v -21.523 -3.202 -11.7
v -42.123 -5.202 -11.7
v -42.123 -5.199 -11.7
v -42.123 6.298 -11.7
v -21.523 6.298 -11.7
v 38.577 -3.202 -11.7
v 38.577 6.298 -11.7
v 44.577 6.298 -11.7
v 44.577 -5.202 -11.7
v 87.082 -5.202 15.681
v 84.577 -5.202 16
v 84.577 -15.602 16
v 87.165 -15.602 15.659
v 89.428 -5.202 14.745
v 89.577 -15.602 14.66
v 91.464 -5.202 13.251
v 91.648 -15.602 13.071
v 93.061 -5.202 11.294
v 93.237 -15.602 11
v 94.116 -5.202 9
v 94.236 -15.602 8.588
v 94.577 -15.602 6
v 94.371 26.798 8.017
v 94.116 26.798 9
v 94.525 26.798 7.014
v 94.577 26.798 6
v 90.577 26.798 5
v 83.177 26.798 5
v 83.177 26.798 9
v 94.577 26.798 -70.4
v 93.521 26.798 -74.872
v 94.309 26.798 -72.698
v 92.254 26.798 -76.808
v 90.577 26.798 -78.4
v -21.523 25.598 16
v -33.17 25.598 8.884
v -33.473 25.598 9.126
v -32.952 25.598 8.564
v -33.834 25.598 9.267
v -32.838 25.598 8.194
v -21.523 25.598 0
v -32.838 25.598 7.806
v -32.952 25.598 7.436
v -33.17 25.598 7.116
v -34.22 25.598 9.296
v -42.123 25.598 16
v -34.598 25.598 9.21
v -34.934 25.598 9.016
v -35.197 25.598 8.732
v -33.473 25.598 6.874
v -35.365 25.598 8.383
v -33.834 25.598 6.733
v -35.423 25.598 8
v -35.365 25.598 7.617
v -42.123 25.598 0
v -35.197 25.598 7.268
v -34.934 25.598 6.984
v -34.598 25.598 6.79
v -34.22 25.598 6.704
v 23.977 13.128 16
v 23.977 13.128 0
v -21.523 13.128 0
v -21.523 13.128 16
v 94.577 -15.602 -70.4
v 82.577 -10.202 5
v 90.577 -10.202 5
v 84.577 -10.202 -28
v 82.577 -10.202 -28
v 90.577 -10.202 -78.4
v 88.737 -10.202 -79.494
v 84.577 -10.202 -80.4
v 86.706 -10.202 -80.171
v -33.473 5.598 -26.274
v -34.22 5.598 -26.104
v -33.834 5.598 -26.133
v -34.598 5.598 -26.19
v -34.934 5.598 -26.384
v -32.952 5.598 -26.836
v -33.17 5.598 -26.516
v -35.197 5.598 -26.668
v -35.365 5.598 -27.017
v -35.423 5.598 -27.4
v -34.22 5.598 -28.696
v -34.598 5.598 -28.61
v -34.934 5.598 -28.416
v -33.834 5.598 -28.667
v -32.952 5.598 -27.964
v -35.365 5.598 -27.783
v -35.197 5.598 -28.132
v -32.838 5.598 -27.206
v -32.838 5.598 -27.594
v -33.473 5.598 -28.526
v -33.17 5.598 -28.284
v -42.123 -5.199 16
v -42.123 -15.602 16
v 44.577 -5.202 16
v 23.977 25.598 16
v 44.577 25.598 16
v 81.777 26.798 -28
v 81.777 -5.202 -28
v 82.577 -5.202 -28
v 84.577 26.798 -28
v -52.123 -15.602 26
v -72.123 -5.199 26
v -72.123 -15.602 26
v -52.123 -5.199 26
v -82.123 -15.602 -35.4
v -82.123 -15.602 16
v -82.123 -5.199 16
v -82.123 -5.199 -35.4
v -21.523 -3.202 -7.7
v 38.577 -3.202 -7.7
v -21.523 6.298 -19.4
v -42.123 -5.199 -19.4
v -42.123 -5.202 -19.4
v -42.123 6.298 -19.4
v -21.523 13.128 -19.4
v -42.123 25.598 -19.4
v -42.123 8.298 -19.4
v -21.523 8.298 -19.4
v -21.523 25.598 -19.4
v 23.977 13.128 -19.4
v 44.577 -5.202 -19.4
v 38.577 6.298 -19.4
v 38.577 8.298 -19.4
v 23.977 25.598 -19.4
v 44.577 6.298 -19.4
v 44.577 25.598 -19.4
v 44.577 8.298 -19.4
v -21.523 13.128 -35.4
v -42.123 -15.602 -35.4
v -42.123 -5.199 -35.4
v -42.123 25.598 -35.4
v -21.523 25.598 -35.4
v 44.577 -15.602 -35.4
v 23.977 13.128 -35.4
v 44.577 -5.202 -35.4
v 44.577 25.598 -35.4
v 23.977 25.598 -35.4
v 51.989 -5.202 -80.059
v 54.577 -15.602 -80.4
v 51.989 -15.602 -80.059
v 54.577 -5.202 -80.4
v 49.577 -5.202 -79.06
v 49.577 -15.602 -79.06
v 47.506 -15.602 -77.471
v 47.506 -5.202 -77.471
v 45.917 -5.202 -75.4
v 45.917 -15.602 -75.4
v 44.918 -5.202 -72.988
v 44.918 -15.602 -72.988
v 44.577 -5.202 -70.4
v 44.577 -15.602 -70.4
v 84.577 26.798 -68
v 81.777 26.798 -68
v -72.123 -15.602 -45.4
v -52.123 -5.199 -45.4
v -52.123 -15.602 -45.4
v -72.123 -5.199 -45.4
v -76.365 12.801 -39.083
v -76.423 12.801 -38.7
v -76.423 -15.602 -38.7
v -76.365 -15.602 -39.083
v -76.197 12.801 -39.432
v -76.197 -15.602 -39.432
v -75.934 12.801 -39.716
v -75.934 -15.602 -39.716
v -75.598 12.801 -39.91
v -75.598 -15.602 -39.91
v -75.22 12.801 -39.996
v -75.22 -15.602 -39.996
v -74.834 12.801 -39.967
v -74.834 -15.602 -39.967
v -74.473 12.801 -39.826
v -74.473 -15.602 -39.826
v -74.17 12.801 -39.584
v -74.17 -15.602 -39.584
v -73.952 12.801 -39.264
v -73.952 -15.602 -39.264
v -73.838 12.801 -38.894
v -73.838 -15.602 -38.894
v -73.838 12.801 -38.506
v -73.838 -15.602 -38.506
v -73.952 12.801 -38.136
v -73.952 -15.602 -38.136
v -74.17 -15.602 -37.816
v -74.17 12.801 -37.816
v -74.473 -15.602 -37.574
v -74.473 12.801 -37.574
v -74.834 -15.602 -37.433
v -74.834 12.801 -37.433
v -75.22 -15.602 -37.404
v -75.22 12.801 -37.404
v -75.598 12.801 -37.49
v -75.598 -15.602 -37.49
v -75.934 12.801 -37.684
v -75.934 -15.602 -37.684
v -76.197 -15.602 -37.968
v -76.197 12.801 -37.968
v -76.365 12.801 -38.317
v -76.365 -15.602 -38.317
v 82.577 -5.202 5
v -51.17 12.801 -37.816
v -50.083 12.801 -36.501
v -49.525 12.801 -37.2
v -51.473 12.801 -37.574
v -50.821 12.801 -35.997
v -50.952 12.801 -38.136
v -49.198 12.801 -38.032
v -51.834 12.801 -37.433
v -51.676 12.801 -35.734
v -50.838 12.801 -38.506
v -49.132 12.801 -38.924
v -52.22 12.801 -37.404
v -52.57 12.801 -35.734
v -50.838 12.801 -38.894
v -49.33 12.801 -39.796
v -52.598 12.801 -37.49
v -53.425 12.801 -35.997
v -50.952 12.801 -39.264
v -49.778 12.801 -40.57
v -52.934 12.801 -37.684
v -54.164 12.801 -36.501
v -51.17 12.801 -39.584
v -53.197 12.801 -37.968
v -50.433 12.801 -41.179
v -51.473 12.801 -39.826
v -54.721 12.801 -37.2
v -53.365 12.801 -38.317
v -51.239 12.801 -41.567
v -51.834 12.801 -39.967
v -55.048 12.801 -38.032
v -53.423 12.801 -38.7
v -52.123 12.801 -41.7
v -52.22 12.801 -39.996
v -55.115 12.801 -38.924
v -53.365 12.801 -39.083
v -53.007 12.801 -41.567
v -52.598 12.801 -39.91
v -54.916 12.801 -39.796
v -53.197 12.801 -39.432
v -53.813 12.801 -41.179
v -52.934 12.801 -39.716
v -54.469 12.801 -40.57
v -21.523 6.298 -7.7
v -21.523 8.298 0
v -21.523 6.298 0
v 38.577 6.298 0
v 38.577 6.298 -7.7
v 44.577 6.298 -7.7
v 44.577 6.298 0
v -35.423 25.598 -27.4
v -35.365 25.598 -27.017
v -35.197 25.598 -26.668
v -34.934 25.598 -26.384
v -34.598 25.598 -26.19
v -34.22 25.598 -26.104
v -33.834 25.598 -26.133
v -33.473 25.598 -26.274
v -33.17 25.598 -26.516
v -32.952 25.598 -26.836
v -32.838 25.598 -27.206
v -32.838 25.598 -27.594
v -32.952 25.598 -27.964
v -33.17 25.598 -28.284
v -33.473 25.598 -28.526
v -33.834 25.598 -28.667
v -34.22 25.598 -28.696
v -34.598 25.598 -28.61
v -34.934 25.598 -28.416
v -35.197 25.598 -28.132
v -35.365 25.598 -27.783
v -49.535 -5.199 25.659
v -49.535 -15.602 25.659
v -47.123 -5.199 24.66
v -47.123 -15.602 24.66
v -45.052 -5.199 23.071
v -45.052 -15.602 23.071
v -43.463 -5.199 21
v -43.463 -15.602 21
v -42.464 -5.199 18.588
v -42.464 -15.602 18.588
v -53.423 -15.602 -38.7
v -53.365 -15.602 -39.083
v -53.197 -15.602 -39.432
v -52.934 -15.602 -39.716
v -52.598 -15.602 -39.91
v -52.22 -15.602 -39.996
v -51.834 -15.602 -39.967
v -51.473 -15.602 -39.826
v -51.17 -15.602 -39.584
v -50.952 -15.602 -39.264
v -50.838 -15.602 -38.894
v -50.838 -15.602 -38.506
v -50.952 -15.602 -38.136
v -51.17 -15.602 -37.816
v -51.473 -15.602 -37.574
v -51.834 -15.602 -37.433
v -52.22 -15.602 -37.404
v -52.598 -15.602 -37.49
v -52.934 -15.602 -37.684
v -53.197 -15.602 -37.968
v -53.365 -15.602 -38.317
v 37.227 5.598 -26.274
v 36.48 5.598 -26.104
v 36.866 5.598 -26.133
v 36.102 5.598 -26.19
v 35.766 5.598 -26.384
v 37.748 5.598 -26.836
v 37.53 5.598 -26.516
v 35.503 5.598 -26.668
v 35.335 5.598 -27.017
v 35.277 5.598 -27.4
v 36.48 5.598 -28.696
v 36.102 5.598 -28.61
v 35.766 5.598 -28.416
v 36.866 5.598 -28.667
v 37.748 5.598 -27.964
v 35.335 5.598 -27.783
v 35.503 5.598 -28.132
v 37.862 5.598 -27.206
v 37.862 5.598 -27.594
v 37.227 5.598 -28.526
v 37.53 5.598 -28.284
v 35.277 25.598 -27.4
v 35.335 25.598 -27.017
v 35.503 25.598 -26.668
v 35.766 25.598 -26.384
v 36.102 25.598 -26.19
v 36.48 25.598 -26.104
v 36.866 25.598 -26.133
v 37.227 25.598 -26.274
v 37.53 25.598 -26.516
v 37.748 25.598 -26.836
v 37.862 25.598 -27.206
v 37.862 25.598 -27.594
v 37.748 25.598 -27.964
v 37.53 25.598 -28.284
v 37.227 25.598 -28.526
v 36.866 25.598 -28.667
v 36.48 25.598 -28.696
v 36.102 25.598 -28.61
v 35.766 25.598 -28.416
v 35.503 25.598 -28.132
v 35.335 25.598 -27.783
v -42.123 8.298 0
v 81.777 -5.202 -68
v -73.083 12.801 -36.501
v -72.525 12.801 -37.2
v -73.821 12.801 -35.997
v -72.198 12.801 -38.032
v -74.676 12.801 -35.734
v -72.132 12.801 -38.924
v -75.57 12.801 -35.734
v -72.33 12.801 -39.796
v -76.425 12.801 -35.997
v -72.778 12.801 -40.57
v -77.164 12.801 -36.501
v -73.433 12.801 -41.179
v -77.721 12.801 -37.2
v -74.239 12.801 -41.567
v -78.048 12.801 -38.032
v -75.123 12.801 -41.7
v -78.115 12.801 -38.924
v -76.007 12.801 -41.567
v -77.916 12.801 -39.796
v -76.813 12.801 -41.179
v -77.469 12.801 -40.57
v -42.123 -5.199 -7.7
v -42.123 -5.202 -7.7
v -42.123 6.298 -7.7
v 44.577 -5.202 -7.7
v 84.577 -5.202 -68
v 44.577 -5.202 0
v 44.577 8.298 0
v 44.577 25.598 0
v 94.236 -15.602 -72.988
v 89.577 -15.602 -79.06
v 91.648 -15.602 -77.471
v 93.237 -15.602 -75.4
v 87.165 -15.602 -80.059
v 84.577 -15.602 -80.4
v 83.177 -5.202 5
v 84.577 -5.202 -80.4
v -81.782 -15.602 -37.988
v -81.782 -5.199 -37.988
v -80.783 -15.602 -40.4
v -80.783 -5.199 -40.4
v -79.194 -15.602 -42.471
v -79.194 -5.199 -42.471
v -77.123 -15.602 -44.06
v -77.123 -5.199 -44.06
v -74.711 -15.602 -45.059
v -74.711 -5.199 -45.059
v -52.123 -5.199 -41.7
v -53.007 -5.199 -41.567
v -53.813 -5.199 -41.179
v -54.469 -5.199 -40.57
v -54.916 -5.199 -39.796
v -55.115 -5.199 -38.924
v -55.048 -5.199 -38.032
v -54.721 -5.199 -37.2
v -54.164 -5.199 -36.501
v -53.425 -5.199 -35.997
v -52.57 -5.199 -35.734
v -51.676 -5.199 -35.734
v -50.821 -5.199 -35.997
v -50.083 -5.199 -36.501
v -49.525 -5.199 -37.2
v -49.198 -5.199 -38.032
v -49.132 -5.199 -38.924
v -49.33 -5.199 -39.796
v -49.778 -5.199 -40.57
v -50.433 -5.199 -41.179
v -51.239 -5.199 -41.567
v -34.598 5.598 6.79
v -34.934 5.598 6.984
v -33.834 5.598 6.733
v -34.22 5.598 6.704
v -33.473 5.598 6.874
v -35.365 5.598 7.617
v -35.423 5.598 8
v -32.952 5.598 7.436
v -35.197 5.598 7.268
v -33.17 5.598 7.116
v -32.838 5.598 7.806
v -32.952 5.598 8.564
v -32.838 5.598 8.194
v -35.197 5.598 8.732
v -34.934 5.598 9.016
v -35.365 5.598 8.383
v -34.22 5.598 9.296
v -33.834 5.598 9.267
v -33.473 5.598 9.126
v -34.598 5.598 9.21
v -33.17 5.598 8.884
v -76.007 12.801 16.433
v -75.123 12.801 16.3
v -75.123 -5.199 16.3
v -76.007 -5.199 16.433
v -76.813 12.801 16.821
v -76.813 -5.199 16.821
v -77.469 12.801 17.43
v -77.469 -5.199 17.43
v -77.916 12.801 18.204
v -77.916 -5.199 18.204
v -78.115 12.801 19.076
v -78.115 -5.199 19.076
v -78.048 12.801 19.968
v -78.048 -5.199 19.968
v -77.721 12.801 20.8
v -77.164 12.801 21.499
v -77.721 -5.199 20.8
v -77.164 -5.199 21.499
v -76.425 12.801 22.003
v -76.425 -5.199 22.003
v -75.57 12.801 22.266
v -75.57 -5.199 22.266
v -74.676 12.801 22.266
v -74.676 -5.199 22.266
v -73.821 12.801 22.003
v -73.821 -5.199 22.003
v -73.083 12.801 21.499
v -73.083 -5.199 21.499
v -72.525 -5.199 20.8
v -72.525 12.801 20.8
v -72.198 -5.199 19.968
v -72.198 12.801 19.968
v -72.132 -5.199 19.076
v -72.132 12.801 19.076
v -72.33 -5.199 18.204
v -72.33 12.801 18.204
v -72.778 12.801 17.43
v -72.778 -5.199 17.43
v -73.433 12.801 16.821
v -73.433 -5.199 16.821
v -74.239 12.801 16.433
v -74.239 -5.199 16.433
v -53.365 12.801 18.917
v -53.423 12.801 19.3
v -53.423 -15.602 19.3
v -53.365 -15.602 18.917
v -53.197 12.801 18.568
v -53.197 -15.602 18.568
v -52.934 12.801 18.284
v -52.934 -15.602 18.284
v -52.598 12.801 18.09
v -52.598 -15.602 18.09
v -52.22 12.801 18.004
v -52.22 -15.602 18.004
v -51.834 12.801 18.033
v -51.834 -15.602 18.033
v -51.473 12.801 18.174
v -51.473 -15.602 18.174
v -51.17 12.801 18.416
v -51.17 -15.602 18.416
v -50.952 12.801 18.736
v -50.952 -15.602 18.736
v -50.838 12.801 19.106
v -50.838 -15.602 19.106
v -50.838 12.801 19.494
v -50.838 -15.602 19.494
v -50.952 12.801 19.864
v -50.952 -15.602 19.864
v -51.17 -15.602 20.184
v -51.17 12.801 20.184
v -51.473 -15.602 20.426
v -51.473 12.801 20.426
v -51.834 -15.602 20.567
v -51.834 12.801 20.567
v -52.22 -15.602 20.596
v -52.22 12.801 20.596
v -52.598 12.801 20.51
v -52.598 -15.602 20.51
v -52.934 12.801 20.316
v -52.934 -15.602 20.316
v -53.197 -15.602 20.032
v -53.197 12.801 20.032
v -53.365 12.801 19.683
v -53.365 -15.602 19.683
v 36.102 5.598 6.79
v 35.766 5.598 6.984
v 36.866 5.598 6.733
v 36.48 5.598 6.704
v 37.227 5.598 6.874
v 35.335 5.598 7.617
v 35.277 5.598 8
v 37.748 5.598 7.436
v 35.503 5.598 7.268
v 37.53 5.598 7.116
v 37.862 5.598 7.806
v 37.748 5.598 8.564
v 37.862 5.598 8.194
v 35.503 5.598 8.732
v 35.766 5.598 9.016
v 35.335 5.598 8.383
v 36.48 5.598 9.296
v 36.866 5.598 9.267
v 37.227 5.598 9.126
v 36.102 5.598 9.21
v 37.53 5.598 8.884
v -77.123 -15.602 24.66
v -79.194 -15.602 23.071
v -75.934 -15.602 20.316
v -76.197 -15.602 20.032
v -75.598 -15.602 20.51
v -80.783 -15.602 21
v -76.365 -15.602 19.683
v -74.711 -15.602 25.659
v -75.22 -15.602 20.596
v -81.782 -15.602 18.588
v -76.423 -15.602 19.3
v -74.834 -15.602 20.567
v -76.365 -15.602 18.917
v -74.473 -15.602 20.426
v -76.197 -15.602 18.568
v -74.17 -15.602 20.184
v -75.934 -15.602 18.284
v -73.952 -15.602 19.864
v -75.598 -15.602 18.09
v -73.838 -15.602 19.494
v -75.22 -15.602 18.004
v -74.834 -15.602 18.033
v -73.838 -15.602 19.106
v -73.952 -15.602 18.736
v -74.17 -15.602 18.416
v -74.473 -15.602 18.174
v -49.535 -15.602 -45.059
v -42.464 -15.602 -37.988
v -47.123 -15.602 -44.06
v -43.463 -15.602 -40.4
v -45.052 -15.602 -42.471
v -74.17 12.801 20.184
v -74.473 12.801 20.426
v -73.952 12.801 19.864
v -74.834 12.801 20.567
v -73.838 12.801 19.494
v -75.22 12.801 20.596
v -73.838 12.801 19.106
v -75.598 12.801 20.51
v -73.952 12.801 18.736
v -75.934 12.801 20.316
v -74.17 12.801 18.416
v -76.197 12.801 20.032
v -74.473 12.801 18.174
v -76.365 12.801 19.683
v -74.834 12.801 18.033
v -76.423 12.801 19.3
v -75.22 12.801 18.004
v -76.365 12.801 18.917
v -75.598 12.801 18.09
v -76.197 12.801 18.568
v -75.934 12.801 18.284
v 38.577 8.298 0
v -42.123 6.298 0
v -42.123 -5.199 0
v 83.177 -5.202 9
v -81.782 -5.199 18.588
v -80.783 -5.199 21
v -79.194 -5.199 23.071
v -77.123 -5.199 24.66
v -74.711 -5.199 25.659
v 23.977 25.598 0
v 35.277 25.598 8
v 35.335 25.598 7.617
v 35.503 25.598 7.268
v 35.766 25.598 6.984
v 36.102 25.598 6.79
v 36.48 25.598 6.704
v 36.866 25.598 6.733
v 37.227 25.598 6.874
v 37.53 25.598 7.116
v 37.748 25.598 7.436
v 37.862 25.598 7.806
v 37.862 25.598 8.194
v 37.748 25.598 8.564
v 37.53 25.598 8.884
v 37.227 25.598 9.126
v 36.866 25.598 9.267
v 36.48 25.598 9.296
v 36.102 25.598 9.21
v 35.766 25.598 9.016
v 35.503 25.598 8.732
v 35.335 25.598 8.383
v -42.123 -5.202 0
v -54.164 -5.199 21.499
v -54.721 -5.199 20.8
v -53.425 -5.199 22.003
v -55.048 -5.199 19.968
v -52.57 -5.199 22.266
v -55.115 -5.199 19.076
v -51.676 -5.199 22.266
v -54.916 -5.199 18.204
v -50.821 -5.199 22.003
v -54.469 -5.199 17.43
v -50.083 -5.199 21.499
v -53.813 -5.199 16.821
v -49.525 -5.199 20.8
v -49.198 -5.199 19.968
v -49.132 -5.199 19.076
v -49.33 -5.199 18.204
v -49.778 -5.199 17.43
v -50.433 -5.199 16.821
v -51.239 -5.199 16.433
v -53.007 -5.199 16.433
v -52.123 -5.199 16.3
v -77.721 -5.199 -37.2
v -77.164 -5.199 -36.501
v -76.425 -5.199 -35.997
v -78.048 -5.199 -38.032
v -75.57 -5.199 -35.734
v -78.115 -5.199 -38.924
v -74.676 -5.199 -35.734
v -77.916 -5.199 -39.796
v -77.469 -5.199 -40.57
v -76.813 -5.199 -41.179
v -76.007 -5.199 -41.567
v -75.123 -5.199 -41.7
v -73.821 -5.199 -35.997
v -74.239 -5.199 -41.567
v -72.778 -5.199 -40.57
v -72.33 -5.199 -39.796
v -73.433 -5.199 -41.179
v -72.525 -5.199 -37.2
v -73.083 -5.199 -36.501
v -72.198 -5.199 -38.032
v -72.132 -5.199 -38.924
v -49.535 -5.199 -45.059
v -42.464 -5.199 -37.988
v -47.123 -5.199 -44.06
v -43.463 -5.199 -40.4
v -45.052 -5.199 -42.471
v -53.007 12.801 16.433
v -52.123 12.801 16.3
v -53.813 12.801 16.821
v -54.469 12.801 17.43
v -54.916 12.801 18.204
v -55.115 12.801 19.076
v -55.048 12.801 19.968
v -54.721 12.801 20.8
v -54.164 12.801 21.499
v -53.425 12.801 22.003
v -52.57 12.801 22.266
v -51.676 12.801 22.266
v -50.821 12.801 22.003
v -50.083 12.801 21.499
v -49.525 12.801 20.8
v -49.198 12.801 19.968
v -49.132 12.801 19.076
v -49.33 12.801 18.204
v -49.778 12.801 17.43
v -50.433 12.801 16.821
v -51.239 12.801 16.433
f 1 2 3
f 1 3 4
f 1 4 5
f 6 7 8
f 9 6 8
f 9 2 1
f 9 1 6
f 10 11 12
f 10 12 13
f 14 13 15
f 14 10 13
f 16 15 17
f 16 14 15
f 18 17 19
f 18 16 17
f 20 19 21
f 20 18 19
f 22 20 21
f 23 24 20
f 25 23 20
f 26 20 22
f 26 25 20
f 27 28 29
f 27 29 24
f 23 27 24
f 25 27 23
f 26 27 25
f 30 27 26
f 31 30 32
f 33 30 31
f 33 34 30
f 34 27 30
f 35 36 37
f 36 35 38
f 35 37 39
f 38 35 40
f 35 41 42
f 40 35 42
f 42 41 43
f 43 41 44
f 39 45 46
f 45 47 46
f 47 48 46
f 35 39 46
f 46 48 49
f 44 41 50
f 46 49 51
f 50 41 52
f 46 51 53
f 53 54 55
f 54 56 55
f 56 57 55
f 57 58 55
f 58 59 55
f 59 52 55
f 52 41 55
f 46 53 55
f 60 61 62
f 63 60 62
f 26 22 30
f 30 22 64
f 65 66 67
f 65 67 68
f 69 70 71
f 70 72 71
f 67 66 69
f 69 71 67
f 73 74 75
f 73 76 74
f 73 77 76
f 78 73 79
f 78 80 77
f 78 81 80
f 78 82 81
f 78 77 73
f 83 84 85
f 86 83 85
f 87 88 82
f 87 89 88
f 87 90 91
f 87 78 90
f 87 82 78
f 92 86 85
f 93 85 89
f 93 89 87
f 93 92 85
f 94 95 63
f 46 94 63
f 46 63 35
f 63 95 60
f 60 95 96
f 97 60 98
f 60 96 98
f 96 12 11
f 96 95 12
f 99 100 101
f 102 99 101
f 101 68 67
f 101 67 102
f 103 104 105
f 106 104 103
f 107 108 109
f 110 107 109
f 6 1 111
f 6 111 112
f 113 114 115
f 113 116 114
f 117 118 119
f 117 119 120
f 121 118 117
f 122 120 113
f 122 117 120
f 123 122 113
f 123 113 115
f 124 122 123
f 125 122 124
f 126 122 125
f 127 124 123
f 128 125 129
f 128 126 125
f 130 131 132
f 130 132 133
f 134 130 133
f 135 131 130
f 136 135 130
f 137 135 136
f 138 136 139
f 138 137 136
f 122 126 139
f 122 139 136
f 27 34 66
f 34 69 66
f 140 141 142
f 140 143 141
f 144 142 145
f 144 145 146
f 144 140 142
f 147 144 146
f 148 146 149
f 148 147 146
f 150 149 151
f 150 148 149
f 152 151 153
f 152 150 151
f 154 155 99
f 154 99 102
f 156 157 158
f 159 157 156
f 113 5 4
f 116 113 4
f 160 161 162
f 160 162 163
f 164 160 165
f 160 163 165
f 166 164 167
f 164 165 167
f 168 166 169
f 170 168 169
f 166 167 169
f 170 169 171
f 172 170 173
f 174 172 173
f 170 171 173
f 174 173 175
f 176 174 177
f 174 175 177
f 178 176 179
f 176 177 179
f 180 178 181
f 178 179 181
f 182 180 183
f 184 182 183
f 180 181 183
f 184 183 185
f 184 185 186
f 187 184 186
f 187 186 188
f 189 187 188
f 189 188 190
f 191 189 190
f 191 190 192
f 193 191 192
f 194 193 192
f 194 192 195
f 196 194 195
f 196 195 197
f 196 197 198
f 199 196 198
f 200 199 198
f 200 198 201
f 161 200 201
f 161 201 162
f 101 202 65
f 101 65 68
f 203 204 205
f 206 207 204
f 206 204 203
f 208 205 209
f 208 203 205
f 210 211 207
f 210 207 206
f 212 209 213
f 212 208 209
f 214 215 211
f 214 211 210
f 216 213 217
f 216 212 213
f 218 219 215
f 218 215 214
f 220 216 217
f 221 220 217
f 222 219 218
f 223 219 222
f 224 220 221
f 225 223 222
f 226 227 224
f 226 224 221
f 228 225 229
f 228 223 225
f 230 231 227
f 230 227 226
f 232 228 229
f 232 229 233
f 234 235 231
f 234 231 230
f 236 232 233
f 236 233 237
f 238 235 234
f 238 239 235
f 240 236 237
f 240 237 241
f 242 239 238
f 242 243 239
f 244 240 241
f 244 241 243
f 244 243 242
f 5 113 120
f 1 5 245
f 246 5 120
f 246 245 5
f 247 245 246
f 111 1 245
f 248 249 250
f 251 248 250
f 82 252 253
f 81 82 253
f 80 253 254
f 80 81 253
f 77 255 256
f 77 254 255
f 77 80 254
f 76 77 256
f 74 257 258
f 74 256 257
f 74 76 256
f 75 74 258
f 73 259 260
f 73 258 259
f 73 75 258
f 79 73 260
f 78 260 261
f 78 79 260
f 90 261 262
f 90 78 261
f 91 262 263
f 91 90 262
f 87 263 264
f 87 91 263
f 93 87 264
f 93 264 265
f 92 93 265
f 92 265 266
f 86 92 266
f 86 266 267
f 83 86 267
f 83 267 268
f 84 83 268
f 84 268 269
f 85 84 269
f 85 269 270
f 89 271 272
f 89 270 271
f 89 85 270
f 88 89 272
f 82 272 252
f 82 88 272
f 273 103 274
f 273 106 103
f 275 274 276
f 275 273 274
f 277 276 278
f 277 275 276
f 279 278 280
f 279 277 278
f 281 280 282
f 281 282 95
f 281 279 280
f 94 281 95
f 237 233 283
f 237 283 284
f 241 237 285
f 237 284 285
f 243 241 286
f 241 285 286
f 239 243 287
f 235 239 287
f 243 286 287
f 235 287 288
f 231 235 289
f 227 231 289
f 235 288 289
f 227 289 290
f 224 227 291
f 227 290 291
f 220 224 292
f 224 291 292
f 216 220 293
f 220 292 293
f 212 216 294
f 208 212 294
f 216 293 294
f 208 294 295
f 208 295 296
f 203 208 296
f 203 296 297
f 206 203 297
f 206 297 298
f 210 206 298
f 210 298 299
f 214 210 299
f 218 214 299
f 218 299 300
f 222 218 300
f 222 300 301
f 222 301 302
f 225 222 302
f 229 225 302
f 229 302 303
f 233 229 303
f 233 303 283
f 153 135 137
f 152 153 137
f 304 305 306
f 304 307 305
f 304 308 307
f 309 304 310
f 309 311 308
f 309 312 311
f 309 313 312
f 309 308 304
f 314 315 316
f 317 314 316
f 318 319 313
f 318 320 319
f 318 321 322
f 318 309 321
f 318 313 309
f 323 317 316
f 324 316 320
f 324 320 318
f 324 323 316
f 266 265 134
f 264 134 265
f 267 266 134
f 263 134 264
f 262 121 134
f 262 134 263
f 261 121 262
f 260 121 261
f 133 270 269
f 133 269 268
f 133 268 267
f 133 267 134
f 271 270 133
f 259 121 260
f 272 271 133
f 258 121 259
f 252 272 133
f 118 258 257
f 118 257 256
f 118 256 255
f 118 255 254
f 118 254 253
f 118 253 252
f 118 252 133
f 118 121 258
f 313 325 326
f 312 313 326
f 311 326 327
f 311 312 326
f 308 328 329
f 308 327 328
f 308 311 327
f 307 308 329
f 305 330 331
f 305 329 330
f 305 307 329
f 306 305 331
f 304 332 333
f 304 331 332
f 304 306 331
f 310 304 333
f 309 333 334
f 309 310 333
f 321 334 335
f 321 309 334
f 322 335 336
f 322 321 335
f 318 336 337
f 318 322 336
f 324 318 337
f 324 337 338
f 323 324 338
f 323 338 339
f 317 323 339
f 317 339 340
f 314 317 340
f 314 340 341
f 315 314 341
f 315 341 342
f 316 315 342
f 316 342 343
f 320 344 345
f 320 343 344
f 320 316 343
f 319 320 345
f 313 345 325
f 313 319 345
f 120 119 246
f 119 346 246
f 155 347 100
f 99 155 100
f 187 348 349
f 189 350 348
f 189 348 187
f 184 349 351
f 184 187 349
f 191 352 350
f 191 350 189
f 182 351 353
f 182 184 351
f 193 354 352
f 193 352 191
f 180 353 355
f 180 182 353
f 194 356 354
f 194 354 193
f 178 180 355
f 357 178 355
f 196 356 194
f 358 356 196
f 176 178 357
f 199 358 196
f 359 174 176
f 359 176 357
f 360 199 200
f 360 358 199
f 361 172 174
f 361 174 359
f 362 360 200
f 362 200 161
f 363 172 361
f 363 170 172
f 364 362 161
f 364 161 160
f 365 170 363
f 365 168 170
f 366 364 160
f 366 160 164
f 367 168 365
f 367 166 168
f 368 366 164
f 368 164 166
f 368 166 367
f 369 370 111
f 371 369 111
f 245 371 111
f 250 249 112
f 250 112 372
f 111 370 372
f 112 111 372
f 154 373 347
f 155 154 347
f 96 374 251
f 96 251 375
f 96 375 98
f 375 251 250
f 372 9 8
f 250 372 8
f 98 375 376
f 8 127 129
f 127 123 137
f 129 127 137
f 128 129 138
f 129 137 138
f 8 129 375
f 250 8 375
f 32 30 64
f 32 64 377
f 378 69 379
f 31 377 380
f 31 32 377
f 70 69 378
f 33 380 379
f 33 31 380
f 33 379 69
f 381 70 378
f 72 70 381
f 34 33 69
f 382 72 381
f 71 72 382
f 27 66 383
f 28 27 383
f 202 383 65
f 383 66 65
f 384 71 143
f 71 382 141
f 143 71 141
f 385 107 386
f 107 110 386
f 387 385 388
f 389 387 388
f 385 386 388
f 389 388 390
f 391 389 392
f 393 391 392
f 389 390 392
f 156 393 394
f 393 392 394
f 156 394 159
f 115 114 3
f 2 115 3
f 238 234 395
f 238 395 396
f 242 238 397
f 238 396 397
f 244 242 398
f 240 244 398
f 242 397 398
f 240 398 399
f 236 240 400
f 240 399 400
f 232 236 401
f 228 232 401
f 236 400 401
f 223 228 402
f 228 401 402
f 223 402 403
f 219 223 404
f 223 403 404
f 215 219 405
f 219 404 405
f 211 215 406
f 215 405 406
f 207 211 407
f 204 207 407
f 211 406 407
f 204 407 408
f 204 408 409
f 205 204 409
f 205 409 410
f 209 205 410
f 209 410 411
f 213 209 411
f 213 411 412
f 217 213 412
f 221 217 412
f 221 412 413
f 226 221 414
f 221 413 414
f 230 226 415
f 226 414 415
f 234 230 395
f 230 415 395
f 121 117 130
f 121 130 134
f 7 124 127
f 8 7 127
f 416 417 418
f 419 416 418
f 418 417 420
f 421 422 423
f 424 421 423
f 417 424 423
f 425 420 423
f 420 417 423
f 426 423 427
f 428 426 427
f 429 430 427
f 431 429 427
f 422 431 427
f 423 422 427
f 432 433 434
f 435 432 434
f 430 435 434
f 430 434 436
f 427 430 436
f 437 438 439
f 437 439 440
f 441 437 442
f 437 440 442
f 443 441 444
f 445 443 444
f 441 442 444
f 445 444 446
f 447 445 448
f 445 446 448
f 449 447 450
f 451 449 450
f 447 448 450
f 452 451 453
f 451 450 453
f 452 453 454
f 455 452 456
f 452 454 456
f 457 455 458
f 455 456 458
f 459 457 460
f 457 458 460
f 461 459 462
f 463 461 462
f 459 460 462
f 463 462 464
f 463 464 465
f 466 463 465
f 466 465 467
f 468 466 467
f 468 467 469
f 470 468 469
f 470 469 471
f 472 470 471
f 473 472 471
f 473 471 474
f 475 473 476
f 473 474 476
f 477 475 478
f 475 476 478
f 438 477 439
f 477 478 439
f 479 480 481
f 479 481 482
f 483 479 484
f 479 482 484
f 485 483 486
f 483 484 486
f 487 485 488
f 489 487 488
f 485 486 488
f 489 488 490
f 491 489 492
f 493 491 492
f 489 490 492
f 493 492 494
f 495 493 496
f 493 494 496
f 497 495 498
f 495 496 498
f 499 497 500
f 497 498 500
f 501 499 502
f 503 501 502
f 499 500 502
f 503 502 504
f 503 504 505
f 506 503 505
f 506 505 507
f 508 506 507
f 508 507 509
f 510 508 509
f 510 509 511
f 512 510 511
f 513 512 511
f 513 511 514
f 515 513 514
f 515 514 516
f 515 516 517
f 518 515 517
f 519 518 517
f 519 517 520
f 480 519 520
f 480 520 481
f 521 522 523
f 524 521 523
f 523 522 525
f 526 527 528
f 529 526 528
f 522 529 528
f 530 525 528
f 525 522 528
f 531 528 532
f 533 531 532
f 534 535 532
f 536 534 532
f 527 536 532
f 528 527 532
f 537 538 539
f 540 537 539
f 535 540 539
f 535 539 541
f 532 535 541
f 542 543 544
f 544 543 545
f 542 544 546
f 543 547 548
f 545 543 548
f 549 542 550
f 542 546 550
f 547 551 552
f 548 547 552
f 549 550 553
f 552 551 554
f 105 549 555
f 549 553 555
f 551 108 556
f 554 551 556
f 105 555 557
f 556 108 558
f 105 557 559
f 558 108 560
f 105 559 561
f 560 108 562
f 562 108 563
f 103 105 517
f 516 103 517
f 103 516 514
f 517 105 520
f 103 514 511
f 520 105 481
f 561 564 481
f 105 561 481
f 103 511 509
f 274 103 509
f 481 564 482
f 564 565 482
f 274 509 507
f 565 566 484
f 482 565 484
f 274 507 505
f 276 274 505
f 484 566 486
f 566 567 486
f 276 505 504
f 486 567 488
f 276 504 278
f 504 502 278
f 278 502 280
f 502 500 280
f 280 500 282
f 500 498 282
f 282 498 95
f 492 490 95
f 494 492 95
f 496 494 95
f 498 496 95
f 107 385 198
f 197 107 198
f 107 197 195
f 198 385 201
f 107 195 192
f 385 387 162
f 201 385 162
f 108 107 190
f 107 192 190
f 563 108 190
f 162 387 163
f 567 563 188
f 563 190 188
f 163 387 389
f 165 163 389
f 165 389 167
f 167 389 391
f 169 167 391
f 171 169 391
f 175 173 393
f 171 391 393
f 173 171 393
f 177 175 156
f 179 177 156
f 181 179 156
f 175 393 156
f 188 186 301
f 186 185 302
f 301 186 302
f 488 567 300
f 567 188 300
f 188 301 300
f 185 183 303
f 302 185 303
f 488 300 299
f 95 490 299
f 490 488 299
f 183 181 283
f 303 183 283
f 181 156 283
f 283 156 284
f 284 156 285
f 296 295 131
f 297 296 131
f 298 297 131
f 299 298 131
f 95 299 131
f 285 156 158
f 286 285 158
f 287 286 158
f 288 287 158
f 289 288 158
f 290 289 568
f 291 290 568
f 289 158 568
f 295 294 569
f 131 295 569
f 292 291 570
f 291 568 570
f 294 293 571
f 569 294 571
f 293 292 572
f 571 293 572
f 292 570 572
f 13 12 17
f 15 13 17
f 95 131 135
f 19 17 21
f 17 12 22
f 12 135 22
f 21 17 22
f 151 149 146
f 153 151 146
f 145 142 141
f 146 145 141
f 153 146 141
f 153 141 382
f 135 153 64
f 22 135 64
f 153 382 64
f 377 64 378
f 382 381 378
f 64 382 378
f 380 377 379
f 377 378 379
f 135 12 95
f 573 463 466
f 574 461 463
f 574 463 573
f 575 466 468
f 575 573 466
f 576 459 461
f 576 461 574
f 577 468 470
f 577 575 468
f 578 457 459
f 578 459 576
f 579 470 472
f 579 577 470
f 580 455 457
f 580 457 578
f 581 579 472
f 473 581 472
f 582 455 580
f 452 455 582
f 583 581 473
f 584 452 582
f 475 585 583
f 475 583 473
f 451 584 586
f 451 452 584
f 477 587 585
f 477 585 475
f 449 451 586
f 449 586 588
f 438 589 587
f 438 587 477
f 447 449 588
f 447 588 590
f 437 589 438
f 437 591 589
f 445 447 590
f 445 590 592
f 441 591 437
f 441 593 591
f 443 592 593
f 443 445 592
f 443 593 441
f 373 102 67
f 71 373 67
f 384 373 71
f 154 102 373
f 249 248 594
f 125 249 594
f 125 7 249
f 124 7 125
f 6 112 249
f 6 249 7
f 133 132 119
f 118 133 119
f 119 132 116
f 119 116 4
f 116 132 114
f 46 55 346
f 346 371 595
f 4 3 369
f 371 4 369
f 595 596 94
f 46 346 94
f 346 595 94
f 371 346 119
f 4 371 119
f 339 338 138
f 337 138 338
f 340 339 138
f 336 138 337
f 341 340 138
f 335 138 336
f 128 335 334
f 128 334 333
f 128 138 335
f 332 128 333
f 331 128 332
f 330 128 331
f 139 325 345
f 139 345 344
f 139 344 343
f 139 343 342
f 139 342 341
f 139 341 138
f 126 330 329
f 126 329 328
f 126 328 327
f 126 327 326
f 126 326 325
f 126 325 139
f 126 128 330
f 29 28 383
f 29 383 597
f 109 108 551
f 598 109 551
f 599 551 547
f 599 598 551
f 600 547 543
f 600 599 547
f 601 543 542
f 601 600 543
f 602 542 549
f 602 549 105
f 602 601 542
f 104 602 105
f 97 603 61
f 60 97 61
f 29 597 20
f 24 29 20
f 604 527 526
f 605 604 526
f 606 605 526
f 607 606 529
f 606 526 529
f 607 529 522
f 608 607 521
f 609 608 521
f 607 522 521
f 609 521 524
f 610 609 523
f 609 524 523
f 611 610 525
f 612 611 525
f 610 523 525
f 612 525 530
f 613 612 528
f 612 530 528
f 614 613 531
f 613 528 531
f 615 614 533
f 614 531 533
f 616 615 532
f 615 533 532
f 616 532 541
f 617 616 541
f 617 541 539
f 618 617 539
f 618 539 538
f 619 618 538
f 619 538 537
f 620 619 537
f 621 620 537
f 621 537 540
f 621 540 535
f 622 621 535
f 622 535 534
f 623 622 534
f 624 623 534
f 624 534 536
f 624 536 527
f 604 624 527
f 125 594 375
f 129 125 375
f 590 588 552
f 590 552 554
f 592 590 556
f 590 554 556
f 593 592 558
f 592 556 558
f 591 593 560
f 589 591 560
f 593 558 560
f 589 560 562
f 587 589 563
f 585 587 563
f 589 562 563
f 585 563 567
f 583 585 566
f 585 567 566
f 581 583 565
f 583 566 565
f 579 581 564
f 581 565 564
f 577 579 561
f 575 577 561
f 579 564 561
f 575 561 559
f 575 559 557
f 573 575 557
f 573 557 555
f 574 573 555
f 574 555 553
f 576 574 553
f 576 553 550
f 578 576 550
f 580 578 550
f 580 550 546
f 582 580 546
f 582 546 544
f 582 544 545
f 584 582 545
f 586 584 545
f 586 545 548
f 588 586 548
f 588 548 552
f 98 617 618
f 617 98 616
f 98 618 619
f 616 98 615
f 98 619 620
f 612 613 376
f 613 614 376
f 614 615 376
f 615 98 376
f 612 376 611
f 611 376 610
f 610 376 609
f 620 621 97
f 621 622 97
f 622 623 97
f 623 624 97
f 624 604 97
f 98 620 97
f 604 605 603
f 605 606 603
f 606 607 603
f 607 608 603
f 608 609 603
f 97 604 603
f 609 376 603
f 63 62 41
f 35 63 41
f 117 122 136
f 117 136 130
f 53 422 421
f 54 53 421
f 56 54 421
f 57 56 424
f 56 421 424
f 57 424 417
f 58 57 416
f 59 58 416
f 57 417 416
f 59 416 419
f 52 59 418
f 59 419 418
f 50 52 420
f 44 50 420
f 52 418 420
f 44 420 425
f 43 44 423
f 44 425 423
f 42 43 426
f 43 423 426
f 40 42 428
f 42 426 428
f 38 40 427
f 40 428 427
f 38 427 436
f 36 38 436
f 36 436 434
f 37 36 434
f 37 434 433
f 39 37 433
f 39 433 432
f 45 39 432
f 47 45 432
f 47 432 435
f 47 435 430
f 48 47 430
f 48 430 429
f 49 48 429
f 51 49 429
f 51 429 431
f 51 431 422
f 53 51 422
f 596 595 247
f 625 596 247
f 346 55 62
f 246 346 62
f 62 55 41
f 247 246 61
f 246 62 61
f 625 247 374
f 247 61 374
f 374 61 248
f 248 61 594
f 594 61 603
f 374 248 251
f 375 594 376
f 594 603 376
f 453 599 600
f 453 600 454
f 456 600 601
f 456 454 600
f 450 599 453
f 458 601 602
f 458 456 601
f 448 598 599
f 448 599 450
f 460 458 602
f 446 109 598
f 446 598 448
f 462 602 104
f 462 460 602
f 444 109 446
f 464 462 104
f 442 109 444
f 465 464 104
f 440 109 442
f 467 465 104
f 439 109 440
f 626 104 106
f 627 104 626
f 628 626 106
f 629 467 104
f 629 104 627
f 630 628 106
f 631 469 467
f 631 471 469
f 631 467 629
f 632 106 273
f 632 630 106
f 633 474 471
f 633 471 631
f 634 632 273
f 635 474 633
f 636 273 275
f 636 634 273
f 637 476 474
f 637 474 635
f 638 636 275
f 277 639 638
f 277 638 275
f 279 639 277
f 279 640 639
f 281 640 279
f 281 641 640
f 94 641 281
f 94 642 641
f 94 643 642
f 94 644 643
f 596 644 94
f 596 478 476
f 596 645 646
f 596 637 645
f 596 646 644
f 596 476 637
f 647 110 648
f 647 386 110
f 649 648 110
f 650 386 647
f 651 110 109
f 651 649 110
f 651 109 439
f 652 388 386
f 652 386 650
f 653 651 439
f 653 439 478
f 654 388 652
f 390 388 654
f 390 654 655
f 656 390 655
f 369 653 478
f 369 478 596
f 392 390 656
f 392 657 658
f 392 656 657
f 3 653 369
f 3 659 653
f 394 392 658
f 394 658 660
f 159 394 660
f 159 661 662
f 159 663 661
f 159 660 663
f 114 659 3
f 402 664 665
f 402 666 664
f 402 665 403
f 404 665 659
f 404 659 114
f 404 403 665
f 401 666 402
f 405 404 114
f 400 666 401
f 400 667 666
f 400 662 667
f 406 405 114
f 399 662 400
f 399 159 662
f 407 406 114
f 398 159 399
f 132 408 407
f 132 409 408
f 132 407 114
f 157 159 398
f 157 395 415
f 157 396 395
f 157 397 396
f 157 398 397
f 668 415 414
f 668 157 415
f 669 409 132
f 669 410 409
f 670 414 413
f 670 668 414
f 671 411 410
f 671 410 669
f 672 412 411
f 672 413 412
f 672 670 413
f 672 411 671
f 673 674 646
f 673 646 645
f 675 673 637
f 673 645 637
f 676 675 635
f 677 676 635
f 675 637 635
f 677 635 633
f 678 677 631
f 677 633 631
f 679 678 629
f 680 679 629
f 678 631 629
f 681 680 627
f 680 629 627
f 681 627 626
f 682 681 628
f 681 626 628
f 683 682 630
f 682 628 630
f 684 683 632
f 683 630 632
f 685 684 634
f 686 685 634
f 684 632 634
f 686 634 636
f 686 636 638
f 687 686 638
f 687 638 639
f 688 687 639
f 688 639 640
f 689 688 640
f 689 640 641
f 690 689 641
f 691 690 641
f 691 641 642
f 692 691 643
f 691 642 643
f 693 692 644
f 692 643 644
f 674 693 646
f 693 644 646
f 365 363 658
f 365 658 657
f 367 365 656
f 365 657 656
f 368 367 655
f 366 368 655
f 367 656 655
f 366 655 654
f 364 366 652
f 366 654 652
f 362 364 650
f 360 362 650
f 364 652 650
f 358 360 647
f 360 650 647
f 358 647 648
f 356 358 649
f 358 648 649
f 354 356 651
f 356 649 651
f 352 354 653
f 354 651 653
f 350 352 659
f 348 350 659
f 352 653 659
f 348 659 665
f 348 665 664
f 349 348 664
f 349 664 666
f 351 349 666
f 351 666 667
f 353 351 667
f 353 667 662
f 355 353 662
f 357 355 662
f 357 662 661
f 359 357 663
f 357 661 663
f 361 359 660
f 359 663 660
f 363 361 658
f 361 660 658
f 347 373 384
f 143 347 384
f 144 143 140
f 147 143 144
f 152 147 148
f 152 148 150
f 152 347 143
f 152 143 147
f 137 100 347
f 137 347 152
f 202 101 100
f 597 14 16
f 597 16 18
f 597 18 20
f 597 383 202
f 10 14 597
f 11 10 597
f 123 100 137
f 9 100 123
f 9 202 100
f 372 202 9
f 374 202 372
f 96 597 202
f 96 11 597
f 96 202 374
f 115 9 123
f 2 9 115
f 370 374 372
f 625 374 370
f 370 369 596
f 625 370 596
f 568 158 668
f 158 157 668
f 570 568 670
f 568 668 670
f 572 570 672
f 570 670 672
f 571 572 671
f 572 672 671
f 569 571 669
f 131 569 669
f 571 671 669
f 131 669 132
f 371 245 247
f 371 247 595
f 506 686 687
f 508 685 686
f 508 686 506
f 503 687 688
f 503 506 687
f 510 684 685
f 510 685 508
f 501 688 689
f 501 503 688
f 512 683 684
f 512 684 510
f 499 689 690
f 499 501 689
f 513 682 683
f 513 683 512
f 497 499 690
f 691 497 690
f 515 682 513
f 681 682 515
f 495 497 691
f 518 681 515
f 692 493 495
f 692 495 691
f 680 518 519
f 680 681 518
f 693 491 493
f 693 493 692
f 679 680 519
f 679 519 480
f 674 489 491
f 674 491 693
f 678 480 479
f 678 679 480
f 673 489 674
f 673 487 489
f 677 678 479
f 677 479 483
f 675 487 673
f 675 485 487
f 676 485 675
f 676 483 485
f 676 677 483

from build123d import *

# Parameters (mm, degrees)
EXTRUDE_1_DEPTH     = 16
F_1_0MM_1_D         = 2.6
F_1_0MM_2_D         = 2.6
SKETCH_8_W          = 86.7
SKETCH_8_H          = 16
EXTRUDE_2_DEPTH     = 21.2
SKETCH_9_W          = 86.7
SKETCH_9_H          = 10.4
EXTRUDE_3_DEPTH     = 9.7
SKETCH_15_W         = 20.6
SKETCH_15_H         = 2
EXTRUDE_8_DEPTH     = 13.5
SKETCH_16_W         = 20.6
SKETCH_16_H         = 2
EXTRUDE_9_DEPTH     = 10.5
SKETCH_19_W         = 51.4
SKETCH_19_H         = 10.4
EXTRUDE_10_DEPTH    = 50
SKETCH_25_W         = 50
SKETCH_25_H         = 10.4
EXTRUDE_11_DEPTH    = 45
EXTRUDE_12_DEPTH    = 32
CUT_EXTRUDE_1_DEPTH = 5
SKETCH_29_W         = 51.4
SKETCH_29_H         = 10.402970243
EXTRUDE_13_DEPTH    = 40
SKETCH_32_W         = 40
SKETCH_32_H         = 10.402970243
EXTRUDE_14_DEPTH    = 10
SKETCH_33_W         = 40
SKETCH_33_H         = 10.402970243
EXTRUDE_15_DEPTH    = 10
SKETCH_34_R         = 3
EXTRUDE_16_DEPTH    = 18
F_1_0MM_3_D         = 2.6
F_1_0MM_4_D         = 2.6
FILLET_1_R          = 10
FILLET_2_R          = 10
SKETCH_40_W         = 6
SKETCH_40_H         = 4
EXTRUDE_17_DEPTH    = 11.5
SKETCH_42_W         = 6
SKETCH_42_H         = 19.4
EXTRUDE_18_DEPTH    = 2
SKETCH_46_W         = 60.1
SKETCH_46_H         = 4
EXTRUDE_19_DEPTH    = 2


with BuildPart() as part:
    # 草图1 → 凸台-拉伸1 (new body)
    with BuildSketch(Plane.XY):
        Polygon((-21.523113208, 25.59839861), (-42.123113208, 25.59839861), (-42.123113208, 5.59839861), (44.576886792, 5.59839861), (44.576886792, 25.59839861), (23.976886792, 25.59839861), (23.976886792, 13.12839861), (-21.523113208, 13.12839861), align=None)
    extrude_1 = extrude(amount=EXTRUDE_1_DEPTH)

    # Ø1.0mm 暗销孔1 (through all)
    with Locations(Plane(origin=(0, 25.59839861, 0), x_dir=(1, 0, 0), z_dir=(0, 1, 0))):
        with Locations((36.576886792, -8)):
            f_1_0mm_1 = Hole(F_1_0MM_1_D / 2)

    # Ø1.0mm 暗销孔2 (through all)
    with Locations(Plane(origin=(0, 25.59839861, 0), x_dir=(1, 0, 0), z_dir=(0, 1, 0))):
        with Locations((-34.123113208, -8)):
            f_1_0mm_2 = Hole(F_1_0MM_2_D / 2)

    # 草图8 → 凸台-拉伸2 (add)
    with BuildSketch(Plane.XZ.offset(-5.59839861)):
        with Locations((1.226886792, 8)):
            Rectangle(SKETCH_8_W, SKETCH_8_H)
    extrude_2 = extrude(amount=EXTRUDE_2_DEPTH)

    # 草图9 → 凸台-拉伸3 (add)
    with BuildSketch(Plane(origin=(0, 0, 0), x_dir=(-1, 0, 0), z_dir=(0, 0, -1))):
        with Locations((-1.226886792, -10.40160139)):
            Rectangle(SKETCH_9_W, SKETCH_9_H)
    extrude_3 = extrude(amount=EXTRUDE_3_DEPTH)

    # 草图15 → 凸台-拉伸8 (add)
    with BuildSketch(Plane(origin=(0, -5.20160139, 0), x_dir=(1, 0, 0), z_dir=(0, 1, 0))):
        with Locations((-31.823113208, 8.7)):
            Rectangle(SKETCH_15_W, SKETCH_15_H)
    extrude_8 = extrude(amount=EXTRUDE_8_DEPTH)

    # 草图16 → 凸台-拉伸9 (add)
    with BuildSketch(Plane(origin=(0, 0, -9.7), x_dir=(-1, 0, 0), z_dir=(0, 0, -1))):
        with Locations((31.823113208, 7.29839861)):
            Rectangle(SKETCH_16_W, SKETCH_16_H)
    extrude_9 = extrude(amount=-EXTRUDE_9_DEPTH)

    # 镜向20: 凸台-拉伸1, Ø1.0mm 暗销孔1, Ø1.0mm 暗销孔2, 凸台-拉伸2, 凸台-拉伸3, 凸台-拉伸8, 凸台-拉伸9 across plane
    add(extrude_1.mirror(Plane.XY.offset(-9.7)))
    add(f_1_0mm_1.mirror(Plane.XY.offset(-9.7)), mode=Mode.SUBTRACT)
    add(f_1_0mm_2.mirror(Plane.XY.offset(-9.7)), mode=Mode.SUBTRACT)
    add(extrude_2.mirror(Plane.XY.offset(-9.7)))
    add(extrude_3.mirror(Plane.XY.offset(-9.7)))
    add(extrude_8.mirror(Plane.XY.offset(-9.7)))
    add(extrude_9.mirror(Plane.XY.offset(-9.7)))

    # 草图19 → 凸台-拉伸10 (add)
    with BuildSketch(Plane(origin=(44.576886792, 0, 0), x_dir=(0, 0, -1), z_dir=(1, 0, 0))):
        with Locations((9.7, -10.40160139)):
            Rectangle(SKETCH_19_W, SKETCH_19_H)
    extrude(amount=EXTRUDE_10_DEPTH)

    # 草图25 → 凸台-拉伸11 (add)
    with BuildSketch(Plane(origin=(0, 0, -35.4), x_dir=(-1, 0, 0), z_dir=(0, 0, -1))):
        with Locations((-69.576886792, -10.40160139)):
            Rectangle(SKETCH_25_W, SKETCH_25_H)
    extrude(amount=EXTRUDE_11_DEPTH)

    # 草图26 → 凸台-拉伸12 (add)
    with BuildSketch(Plane(origin=(0, -5.20160139, 0), x_dir=(1, 0, 0), z_dir=(0, 1, 0))):
        Polygon((83.176886792, -9), (94.576886792, -9), (94.576886792, -5), (94.576886792, 80.4), (90.576886792, 80.4), (90.576886792, -5), (83.176886792, -5), align=None)
        Polygon((83.176886792, 28), (84.576886792, 28), (84.576886792, 68), (83.176886792, 68), (81.776886792, 68), (81.776886792, 28), align=None)
    extrude(amount=EXTRUDE_12_DEPTH)

    # 草图28 → 切除-拉伸1 (cut)
    with BuildSketch(Plane(origin=(0, -5.20160139, 0), x_dir=(1, 0, 0), z_dir=(0, 1, 0))):
        Polygon((90.576886792, -5), (84.576886792, -5), (82.576886792, -5), (82.576886792, 28), (84.576886792, 28), (84.576886792, 80.4), (90.576886792, 80.4), align=None)
    extrude(amount=-CUT_EXTRUDE_1_DEPTH, mode=Mode.SUBTRACT)

    # 草图29 → 凸台-拉伸13 (add)
    with BuildSketch(Plane.ZY.offset(42.123113208)):
        with Locations((-9.7, -10.400116268)):
            Rectangle(SKETCH_29_W, SKETCH_29_H)
    extrude(amount=EXTRUDE_13_DEPTH)

    # 草图32 → 凸台-拉伸14 (add)
    with BuildSketch(Plane(origin=(0, 0, -35.4), x_dir=(-1, 0, 0), z_dir=(0, 0, -1))):
        with Locations((62.123113208, -10.400116268)):
            Rectangle(SKETCH_32_W, SKETCH_32_H)
    extrude(amount=EXTRUDE_14_DEPTH)

    # 草图33 → 凸台-拉伸15 (add)
    with BuildSketch(Plane.XY.offset(16)):
        with Locations((-62.123113208, -10.400116268)):
            Rectangle(SKETCH_33_W, SKETCH_33_H)
    extrude(amount=EXTRUDE_15_DEPTH)

    # 草图34 → 凸台-拉伸16 (add)
    with BuildSketch(Plane(origin=(0, -5.198631147, 0), x_dir=(1, 0, 0), z_dir=(0, 1, 0))):
        with Locations(Location((-52.123113208, 38.7, 0), (0, 0, 90))):
            Circle(SKETCH_34_R)
        with Locations(Location((-75.123113208, 38.7, 0), (0, 0, 90))):
            Circle(SKETCH_34_R)
        with Locations(Location((-52.123113208, -19.3, 0), (0, 0, 90))):
            Circle(SKETCH_34_R)
        with Locations(Location((-75.123113208, -19.3, 0), (0, 0, 90))):
            Circle(SKETCH_34_R)
    extrude(amount=EXTRUDE_16_DEPTH)

    # Ø1.0mm 暗销孔3 (through all)
    with Locations(Plane(origin=(0, 12.801368853, 0), x_dir=(1, 0, 0), z_dir=(0, 1, 0))):
        with Locations((-52.123113208, 38.7)):
            Hole(F_1_0MM_3_D / 2)

    # Ø1.0mm 暗销孔4 (through all)
    with Locations(Plane(origin=(0, 12.801368853, 0), x_dir=(1, 0, 0), z_dir=(0, 1, 0))):
        with Locations((-52.123113208, -19.3), (-75.123113208, 38.7), (-75.123113208, -19.3)):
            Hole(F_1_0MM_4_D / 2)

    # 圆角1
    fillet_1_edges = [part.edges().sort_by_distance(p)[0] for p in [
        (44.576886792, -10.40160139, -80.4),
        (94.576886792, -10.40160139, 16),
        (-42.123113208, -10.400116268, -45.4),
        (-42.123113208, -10.400116268, 26),
        (-82.123113208, -10.400116268, -45.4),
        (-82.123113208, -10.400116268, 26),
    ]]
    fillet(fillet_1_edges, radius=FILLET_1_R - 0.0001)  # a hair under: the kernel refuses the full size

    # 圆角2
    fillet_2_edges = [part.edges().sort_by_distance(p)[0] for p in [
        (94.576886792, 5.59839861, -80.4),
    ]]
    fillet(fillet_2_edges, radius=FILLET_2_R - 0.0001)  # a hair under: the kernel refuses the full size

    # 草图40 → 凸台-拉伸17 (add)
    with BuildSketch(Plane(origin=(0, -5.20160139, 0), x_dir=(1, 0, 0), z_dir=(0, 1, 0))):
        with Locations((41.576886792, 9.7)):
            Rectangle(SKETCH_40_W, SKETCH_40_H)
    extrude(amount=EXTRUDE_17_DEPTH)

    # 草图42 → 凸台-拉伸18 (add)
    with BuildSketch(Plane(origin=(0, 6.29839861, 0), x_dir=(1, 0, 0), z_dir=(0, 1, 0))):
        with Locations((41.576886792, 9.7)):
            Rectangle(SKETCH_42_W, SKETCH_42_H)
    extrude(amount=EXTRUDE_18_DEPTH)

    # 草图46 → 凸台-拉伸19 (add)
    with BuildSketch(Plane(origin=(0, -5.20160139, 0), x_dir=(1, 0, 0), z_dir=(0, 1, 0))):
        with Locations((8.526886792, 9.7)):
            Rectangle(SKETCH_46_W, SKETCH_46_H)
    extrude(amount=EXTRUDE_19_DEPTH)


solid = part.part
